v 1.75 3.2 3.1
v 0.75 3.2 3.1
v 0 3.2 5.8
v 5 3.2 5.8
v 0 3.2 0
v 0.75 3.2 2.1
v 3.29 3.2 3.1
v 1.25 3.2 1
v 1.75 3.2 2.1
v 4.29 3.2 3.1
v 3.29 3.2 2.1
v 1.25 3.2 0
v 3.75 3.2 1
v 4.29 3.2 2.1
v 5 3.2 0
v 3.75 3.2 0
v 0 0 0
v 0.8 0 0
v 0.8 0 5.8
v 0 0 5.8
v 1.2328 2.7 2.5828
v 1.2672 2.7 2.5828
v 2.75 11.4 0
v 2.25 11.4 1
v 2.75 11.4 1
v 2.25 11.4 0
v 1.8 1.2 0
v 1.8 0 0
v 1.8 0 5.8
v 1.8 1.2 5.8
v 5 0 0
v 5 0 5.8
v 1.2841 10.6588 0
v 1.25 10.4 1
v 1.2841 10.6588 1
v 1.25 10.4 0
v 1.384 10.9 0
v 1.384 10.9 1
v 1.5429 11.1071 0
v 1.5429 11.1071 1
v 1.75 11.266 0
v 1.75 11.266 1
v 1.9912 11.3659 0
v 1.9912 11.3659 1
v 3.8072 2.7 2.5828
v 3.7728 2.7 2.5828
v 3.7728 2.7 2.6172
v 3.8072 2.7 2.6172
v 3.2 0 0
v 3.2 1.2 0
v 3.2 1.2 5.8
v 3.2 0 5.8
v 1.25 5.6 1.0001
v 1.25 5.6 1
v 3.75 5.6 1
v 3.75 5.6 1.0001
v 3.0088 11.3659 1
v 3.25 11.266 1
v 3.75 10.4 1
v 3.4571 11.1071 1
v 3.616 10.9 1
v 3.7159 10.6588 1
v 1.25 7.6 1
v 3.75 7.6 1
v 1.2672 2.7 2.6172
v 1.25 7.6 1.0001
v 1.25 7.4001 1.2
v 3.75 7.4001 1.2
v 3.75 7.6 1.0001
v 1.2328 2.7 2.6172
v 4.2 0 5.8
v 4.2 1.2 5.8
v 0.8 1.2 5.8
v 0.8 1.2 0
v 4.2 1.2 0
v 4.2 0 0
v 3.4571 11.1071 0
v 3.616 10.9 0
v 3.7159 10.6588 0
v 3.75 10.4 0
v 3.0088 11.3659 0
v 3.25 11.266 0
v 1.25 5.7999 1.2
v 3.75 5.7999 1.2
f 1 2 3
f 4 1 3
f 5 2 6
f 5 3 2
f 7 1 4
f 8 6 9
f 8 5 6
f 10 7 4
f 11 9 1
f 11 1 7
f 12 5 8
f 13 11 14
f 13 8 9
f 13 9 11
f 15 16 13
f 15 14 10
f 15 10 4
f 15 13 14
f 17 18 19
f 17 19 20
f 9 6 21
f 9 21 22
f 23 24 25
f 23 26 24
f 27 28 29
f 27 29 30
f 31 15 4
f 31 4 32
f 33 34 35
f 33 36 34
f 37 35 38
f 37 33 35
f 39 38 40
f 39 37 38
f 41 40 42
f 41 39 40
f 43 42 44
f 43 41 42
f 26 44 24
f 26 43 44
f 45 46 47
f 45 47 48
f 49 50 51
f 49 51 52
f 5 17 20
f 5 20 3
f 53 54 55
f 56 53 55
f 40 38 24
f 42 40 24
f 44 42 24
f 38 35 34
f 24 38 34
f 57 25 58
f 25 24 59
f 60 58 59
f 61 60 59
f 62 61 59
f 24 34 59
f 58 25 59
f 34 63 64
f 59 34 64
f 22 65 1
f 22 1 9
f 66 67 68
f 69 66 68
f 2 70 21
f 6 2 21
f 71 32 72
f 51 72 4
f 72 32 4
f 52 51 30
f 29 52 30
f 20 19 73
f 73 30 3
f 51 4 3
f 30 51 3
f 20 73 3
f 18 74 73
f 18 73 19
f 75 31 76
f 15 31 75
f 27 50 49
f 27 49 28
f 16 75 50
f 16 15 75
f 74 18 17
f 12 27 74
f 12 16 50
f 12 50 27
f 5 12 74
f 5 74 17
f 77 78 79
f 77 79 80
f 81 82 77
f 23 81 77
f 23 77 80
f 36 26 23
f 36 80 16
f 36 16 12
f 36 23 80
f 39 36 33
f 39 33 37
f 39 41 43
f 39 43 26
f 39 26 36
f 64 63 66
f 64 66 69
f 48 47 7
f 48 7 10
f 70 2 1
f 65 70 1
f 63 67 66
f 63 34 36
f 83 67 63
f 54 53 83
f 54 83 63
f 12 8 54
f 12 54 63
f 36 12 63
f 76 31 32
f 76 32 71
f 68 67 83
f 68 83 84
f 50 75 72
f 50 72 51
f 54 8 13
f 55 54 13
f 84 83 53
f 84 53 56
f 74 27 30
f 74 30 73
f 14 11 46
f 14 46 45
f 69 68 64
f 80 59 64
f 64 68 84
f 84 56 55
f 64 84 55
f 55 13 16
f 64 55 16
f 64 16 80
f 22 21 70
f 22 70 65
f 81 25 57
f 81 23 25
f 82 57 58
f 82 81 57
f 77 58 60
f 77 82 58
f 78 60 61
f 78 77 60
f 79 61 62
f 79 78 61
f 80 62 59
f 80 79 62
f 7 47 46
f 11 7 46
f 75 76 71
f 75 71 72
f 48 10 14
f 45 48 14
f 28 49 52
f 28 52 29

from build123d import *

# Parameters (mm, degrees)
EXTRUDE_1_DEPTH                  = 5.8
SKETCH_2_W                       = 2.5
SKETCH_2_H                       = 1
EXTRUDE_2_DEPTH                  = 8.2
SKETCH_3_W                       = 2.5
SKETCH_3_H                       = 2
EXTRUDE_3_DEPTH                  = 0.2
CHAMFER_1_SIZE                   = 0.2
FILLET_1_R                       = 1
SKETCH_4_W                       = 1
SKETCH_4_H                       = 1
CUT_EXTRUDE_1_DEPTH              = 0.5
CUT_EXTRUDE_1_DRAFT              = -44
PATTERN_LINEAR_1_COPY_1_SKETCH_W = 1
PATTERN_LINEAR_1_COPY_1_SKETCH_H = 1
PATTERN_LINEAR_1_COPY_1_DEPTH    = 0.5
PATTERN_LINEAR_1_COPY_1_DRAFT    = -44


with BuildPart() as part:
    # Эскиз1 → Бобышка-Вытянуть1 (new body)
    with BuildSketch(Plane.XY):
        Polygon((0, 0), (0, 3.2), (5, 3.2), (5, 0), (4.2, 0), (4.2, 1.2), (3.2, 1.2), (3.2, 0), (1.8, 0), (1.8, 1.2), (0.8, 1.2), (0.8, 0), align=None)
    extrude(amount=EXTRUDE_1_DEPTH)

    # Эскиз2 → Бобышка-Вытянуть2 (add)
    with BuildSketch(Plane(origin=(0, 3.2, 0), x_dir=(1, 0, 0), z_dir=(0, 1, 0))):
        with Locations((2.5, -0.5)):
            Rectangle(SKETCH_2_W, SKETCH_2_H)
    extrude(amount=EXTRUDE_2_DEPTH)

    # Эскиз3 → Бобышка-Вытянуть3 (add)
    with BuildSketch(Plane.XY.offset(1)):
        with Locations((2.5, 6.6)):
            Rectangle(SKETCH_3_W, SKETCH_3_H)
    extrude(amount=EXTRUDE_3_DEPTH)

    # Фаска1
    chamfer_1_edges = [part.edges().sort_by_distance(p)[0] for p in [
        (2.5, 5.6, 1.2),
        (2.5, 7.6, 1.2),
    ]]
    chamfer(chamfer_1_edges, length=CHAMFER_1_SIZE - 0.0001)  # a hair under: the kernel refuses the full size

    # Скругление1
    fillet_1_edges = [part.edges().sort_by_distance(p)[0] for p in [
        (1.25, 11.4, 0.5),
        (3.75, 11.4, 0.5),
    ]]
    fillet(fillet_1_edges, radius=FILLET_1_R)


with BuildPart() as cut_extrude_1_tool:
    # Эскиз4 → Вырез-Вытянуть1 (with draft: the straight prism first)
    with BuildSketch(Plane(origin=(0, 3.2, 0), x_dir=(1, 0, 0), z_dir=(0, 1, 0))):
        with Locations((1.25, -2.6)):
            Rectangle(SKETCH_4_W, SKETCH_4_H)
    extrude(amount=-CUT_EXTRUDE_1_DEPTH)
    # Вырез-Вытянуть1: the draft: its side faces are tilted about the plane it starts from
    cut_extrude_1_sides = [cut_extrude_1_tool.faces().sort_by_distance(p)[0] for p in [
        (0.75, 2.95, 2.6),
        (1.25, 2.95, 3.1),
        (1.75, 2.95, 2.6),
        (1.25, 2.95, 2.1),
    ]]
    draft(cut_extrude_1_sides, Plane(origin=(0, 3.2, 0), x_dir=(1, 0, 0), z_dir=(0, 1, 0)), CUT_EXTRUDE_1_DRAFT)


with BuildPart() as part_1:
    add(part.part)

    # Вырез-Вытянуть1: cut by cut_extrude_1_tool
    add(cut_extrude_1_tool.part, mode=Mode.SUBTRACT)


with BuildPart() as pattern_linear_1_copy_1_tool:
    # Линейный массив1 copy 1 sketch → Линейный массив1 copy 1 (with draft: the straight prism first)
    with BuildSketch(Plane(origin=(2.54, 3.2, 0), x_dir=(1, 0, 0), z_dir=(0, 1, 0))):
        with Locations((1.25, -2.6)):
            Rectangle(PATTERN_LINEAR_1_COPY_1_SKETCH_W, PATTERN_LINEAR_1_COPY_1_SKETCH_H)
    extrude(amount=-PATTERN_LINEAR_1_COPY_1_DEPTH)
    # Линейный массив1 copy 1: the draft: its side faces are tilted about the plane it starts from
    pattern_linear_1_copy_1_sides = [pattern_linear_1_copy_1_tool.faces().sort_by_distance(p)[0] for p in [
        (3.29, 2.95, 2.6),
        (3.79, 2.95, 3.1),
        (4.29, 2.95, 2.6),
        (3.79, 2.95, 2.1),
    ]]
    draft(pattern_linear_1_copy_1_sides, Plane(origin=(2.54, 3.2, 0), x_dir=(1, 0, 0), z_dir=(0, 1, 0)), PATTERN_LINEAR_1_COPY_1_DRAFT)


with BuildPart() as part_2:
    add(part_1.part)

    # Линейный массив1 copy 1: cut by pattern_linear_1_copy_1_tool
    add(pattern_linear_1_copy_1_tool.part, mode=Mode.SUBTRACT)


solid = part_2.part
